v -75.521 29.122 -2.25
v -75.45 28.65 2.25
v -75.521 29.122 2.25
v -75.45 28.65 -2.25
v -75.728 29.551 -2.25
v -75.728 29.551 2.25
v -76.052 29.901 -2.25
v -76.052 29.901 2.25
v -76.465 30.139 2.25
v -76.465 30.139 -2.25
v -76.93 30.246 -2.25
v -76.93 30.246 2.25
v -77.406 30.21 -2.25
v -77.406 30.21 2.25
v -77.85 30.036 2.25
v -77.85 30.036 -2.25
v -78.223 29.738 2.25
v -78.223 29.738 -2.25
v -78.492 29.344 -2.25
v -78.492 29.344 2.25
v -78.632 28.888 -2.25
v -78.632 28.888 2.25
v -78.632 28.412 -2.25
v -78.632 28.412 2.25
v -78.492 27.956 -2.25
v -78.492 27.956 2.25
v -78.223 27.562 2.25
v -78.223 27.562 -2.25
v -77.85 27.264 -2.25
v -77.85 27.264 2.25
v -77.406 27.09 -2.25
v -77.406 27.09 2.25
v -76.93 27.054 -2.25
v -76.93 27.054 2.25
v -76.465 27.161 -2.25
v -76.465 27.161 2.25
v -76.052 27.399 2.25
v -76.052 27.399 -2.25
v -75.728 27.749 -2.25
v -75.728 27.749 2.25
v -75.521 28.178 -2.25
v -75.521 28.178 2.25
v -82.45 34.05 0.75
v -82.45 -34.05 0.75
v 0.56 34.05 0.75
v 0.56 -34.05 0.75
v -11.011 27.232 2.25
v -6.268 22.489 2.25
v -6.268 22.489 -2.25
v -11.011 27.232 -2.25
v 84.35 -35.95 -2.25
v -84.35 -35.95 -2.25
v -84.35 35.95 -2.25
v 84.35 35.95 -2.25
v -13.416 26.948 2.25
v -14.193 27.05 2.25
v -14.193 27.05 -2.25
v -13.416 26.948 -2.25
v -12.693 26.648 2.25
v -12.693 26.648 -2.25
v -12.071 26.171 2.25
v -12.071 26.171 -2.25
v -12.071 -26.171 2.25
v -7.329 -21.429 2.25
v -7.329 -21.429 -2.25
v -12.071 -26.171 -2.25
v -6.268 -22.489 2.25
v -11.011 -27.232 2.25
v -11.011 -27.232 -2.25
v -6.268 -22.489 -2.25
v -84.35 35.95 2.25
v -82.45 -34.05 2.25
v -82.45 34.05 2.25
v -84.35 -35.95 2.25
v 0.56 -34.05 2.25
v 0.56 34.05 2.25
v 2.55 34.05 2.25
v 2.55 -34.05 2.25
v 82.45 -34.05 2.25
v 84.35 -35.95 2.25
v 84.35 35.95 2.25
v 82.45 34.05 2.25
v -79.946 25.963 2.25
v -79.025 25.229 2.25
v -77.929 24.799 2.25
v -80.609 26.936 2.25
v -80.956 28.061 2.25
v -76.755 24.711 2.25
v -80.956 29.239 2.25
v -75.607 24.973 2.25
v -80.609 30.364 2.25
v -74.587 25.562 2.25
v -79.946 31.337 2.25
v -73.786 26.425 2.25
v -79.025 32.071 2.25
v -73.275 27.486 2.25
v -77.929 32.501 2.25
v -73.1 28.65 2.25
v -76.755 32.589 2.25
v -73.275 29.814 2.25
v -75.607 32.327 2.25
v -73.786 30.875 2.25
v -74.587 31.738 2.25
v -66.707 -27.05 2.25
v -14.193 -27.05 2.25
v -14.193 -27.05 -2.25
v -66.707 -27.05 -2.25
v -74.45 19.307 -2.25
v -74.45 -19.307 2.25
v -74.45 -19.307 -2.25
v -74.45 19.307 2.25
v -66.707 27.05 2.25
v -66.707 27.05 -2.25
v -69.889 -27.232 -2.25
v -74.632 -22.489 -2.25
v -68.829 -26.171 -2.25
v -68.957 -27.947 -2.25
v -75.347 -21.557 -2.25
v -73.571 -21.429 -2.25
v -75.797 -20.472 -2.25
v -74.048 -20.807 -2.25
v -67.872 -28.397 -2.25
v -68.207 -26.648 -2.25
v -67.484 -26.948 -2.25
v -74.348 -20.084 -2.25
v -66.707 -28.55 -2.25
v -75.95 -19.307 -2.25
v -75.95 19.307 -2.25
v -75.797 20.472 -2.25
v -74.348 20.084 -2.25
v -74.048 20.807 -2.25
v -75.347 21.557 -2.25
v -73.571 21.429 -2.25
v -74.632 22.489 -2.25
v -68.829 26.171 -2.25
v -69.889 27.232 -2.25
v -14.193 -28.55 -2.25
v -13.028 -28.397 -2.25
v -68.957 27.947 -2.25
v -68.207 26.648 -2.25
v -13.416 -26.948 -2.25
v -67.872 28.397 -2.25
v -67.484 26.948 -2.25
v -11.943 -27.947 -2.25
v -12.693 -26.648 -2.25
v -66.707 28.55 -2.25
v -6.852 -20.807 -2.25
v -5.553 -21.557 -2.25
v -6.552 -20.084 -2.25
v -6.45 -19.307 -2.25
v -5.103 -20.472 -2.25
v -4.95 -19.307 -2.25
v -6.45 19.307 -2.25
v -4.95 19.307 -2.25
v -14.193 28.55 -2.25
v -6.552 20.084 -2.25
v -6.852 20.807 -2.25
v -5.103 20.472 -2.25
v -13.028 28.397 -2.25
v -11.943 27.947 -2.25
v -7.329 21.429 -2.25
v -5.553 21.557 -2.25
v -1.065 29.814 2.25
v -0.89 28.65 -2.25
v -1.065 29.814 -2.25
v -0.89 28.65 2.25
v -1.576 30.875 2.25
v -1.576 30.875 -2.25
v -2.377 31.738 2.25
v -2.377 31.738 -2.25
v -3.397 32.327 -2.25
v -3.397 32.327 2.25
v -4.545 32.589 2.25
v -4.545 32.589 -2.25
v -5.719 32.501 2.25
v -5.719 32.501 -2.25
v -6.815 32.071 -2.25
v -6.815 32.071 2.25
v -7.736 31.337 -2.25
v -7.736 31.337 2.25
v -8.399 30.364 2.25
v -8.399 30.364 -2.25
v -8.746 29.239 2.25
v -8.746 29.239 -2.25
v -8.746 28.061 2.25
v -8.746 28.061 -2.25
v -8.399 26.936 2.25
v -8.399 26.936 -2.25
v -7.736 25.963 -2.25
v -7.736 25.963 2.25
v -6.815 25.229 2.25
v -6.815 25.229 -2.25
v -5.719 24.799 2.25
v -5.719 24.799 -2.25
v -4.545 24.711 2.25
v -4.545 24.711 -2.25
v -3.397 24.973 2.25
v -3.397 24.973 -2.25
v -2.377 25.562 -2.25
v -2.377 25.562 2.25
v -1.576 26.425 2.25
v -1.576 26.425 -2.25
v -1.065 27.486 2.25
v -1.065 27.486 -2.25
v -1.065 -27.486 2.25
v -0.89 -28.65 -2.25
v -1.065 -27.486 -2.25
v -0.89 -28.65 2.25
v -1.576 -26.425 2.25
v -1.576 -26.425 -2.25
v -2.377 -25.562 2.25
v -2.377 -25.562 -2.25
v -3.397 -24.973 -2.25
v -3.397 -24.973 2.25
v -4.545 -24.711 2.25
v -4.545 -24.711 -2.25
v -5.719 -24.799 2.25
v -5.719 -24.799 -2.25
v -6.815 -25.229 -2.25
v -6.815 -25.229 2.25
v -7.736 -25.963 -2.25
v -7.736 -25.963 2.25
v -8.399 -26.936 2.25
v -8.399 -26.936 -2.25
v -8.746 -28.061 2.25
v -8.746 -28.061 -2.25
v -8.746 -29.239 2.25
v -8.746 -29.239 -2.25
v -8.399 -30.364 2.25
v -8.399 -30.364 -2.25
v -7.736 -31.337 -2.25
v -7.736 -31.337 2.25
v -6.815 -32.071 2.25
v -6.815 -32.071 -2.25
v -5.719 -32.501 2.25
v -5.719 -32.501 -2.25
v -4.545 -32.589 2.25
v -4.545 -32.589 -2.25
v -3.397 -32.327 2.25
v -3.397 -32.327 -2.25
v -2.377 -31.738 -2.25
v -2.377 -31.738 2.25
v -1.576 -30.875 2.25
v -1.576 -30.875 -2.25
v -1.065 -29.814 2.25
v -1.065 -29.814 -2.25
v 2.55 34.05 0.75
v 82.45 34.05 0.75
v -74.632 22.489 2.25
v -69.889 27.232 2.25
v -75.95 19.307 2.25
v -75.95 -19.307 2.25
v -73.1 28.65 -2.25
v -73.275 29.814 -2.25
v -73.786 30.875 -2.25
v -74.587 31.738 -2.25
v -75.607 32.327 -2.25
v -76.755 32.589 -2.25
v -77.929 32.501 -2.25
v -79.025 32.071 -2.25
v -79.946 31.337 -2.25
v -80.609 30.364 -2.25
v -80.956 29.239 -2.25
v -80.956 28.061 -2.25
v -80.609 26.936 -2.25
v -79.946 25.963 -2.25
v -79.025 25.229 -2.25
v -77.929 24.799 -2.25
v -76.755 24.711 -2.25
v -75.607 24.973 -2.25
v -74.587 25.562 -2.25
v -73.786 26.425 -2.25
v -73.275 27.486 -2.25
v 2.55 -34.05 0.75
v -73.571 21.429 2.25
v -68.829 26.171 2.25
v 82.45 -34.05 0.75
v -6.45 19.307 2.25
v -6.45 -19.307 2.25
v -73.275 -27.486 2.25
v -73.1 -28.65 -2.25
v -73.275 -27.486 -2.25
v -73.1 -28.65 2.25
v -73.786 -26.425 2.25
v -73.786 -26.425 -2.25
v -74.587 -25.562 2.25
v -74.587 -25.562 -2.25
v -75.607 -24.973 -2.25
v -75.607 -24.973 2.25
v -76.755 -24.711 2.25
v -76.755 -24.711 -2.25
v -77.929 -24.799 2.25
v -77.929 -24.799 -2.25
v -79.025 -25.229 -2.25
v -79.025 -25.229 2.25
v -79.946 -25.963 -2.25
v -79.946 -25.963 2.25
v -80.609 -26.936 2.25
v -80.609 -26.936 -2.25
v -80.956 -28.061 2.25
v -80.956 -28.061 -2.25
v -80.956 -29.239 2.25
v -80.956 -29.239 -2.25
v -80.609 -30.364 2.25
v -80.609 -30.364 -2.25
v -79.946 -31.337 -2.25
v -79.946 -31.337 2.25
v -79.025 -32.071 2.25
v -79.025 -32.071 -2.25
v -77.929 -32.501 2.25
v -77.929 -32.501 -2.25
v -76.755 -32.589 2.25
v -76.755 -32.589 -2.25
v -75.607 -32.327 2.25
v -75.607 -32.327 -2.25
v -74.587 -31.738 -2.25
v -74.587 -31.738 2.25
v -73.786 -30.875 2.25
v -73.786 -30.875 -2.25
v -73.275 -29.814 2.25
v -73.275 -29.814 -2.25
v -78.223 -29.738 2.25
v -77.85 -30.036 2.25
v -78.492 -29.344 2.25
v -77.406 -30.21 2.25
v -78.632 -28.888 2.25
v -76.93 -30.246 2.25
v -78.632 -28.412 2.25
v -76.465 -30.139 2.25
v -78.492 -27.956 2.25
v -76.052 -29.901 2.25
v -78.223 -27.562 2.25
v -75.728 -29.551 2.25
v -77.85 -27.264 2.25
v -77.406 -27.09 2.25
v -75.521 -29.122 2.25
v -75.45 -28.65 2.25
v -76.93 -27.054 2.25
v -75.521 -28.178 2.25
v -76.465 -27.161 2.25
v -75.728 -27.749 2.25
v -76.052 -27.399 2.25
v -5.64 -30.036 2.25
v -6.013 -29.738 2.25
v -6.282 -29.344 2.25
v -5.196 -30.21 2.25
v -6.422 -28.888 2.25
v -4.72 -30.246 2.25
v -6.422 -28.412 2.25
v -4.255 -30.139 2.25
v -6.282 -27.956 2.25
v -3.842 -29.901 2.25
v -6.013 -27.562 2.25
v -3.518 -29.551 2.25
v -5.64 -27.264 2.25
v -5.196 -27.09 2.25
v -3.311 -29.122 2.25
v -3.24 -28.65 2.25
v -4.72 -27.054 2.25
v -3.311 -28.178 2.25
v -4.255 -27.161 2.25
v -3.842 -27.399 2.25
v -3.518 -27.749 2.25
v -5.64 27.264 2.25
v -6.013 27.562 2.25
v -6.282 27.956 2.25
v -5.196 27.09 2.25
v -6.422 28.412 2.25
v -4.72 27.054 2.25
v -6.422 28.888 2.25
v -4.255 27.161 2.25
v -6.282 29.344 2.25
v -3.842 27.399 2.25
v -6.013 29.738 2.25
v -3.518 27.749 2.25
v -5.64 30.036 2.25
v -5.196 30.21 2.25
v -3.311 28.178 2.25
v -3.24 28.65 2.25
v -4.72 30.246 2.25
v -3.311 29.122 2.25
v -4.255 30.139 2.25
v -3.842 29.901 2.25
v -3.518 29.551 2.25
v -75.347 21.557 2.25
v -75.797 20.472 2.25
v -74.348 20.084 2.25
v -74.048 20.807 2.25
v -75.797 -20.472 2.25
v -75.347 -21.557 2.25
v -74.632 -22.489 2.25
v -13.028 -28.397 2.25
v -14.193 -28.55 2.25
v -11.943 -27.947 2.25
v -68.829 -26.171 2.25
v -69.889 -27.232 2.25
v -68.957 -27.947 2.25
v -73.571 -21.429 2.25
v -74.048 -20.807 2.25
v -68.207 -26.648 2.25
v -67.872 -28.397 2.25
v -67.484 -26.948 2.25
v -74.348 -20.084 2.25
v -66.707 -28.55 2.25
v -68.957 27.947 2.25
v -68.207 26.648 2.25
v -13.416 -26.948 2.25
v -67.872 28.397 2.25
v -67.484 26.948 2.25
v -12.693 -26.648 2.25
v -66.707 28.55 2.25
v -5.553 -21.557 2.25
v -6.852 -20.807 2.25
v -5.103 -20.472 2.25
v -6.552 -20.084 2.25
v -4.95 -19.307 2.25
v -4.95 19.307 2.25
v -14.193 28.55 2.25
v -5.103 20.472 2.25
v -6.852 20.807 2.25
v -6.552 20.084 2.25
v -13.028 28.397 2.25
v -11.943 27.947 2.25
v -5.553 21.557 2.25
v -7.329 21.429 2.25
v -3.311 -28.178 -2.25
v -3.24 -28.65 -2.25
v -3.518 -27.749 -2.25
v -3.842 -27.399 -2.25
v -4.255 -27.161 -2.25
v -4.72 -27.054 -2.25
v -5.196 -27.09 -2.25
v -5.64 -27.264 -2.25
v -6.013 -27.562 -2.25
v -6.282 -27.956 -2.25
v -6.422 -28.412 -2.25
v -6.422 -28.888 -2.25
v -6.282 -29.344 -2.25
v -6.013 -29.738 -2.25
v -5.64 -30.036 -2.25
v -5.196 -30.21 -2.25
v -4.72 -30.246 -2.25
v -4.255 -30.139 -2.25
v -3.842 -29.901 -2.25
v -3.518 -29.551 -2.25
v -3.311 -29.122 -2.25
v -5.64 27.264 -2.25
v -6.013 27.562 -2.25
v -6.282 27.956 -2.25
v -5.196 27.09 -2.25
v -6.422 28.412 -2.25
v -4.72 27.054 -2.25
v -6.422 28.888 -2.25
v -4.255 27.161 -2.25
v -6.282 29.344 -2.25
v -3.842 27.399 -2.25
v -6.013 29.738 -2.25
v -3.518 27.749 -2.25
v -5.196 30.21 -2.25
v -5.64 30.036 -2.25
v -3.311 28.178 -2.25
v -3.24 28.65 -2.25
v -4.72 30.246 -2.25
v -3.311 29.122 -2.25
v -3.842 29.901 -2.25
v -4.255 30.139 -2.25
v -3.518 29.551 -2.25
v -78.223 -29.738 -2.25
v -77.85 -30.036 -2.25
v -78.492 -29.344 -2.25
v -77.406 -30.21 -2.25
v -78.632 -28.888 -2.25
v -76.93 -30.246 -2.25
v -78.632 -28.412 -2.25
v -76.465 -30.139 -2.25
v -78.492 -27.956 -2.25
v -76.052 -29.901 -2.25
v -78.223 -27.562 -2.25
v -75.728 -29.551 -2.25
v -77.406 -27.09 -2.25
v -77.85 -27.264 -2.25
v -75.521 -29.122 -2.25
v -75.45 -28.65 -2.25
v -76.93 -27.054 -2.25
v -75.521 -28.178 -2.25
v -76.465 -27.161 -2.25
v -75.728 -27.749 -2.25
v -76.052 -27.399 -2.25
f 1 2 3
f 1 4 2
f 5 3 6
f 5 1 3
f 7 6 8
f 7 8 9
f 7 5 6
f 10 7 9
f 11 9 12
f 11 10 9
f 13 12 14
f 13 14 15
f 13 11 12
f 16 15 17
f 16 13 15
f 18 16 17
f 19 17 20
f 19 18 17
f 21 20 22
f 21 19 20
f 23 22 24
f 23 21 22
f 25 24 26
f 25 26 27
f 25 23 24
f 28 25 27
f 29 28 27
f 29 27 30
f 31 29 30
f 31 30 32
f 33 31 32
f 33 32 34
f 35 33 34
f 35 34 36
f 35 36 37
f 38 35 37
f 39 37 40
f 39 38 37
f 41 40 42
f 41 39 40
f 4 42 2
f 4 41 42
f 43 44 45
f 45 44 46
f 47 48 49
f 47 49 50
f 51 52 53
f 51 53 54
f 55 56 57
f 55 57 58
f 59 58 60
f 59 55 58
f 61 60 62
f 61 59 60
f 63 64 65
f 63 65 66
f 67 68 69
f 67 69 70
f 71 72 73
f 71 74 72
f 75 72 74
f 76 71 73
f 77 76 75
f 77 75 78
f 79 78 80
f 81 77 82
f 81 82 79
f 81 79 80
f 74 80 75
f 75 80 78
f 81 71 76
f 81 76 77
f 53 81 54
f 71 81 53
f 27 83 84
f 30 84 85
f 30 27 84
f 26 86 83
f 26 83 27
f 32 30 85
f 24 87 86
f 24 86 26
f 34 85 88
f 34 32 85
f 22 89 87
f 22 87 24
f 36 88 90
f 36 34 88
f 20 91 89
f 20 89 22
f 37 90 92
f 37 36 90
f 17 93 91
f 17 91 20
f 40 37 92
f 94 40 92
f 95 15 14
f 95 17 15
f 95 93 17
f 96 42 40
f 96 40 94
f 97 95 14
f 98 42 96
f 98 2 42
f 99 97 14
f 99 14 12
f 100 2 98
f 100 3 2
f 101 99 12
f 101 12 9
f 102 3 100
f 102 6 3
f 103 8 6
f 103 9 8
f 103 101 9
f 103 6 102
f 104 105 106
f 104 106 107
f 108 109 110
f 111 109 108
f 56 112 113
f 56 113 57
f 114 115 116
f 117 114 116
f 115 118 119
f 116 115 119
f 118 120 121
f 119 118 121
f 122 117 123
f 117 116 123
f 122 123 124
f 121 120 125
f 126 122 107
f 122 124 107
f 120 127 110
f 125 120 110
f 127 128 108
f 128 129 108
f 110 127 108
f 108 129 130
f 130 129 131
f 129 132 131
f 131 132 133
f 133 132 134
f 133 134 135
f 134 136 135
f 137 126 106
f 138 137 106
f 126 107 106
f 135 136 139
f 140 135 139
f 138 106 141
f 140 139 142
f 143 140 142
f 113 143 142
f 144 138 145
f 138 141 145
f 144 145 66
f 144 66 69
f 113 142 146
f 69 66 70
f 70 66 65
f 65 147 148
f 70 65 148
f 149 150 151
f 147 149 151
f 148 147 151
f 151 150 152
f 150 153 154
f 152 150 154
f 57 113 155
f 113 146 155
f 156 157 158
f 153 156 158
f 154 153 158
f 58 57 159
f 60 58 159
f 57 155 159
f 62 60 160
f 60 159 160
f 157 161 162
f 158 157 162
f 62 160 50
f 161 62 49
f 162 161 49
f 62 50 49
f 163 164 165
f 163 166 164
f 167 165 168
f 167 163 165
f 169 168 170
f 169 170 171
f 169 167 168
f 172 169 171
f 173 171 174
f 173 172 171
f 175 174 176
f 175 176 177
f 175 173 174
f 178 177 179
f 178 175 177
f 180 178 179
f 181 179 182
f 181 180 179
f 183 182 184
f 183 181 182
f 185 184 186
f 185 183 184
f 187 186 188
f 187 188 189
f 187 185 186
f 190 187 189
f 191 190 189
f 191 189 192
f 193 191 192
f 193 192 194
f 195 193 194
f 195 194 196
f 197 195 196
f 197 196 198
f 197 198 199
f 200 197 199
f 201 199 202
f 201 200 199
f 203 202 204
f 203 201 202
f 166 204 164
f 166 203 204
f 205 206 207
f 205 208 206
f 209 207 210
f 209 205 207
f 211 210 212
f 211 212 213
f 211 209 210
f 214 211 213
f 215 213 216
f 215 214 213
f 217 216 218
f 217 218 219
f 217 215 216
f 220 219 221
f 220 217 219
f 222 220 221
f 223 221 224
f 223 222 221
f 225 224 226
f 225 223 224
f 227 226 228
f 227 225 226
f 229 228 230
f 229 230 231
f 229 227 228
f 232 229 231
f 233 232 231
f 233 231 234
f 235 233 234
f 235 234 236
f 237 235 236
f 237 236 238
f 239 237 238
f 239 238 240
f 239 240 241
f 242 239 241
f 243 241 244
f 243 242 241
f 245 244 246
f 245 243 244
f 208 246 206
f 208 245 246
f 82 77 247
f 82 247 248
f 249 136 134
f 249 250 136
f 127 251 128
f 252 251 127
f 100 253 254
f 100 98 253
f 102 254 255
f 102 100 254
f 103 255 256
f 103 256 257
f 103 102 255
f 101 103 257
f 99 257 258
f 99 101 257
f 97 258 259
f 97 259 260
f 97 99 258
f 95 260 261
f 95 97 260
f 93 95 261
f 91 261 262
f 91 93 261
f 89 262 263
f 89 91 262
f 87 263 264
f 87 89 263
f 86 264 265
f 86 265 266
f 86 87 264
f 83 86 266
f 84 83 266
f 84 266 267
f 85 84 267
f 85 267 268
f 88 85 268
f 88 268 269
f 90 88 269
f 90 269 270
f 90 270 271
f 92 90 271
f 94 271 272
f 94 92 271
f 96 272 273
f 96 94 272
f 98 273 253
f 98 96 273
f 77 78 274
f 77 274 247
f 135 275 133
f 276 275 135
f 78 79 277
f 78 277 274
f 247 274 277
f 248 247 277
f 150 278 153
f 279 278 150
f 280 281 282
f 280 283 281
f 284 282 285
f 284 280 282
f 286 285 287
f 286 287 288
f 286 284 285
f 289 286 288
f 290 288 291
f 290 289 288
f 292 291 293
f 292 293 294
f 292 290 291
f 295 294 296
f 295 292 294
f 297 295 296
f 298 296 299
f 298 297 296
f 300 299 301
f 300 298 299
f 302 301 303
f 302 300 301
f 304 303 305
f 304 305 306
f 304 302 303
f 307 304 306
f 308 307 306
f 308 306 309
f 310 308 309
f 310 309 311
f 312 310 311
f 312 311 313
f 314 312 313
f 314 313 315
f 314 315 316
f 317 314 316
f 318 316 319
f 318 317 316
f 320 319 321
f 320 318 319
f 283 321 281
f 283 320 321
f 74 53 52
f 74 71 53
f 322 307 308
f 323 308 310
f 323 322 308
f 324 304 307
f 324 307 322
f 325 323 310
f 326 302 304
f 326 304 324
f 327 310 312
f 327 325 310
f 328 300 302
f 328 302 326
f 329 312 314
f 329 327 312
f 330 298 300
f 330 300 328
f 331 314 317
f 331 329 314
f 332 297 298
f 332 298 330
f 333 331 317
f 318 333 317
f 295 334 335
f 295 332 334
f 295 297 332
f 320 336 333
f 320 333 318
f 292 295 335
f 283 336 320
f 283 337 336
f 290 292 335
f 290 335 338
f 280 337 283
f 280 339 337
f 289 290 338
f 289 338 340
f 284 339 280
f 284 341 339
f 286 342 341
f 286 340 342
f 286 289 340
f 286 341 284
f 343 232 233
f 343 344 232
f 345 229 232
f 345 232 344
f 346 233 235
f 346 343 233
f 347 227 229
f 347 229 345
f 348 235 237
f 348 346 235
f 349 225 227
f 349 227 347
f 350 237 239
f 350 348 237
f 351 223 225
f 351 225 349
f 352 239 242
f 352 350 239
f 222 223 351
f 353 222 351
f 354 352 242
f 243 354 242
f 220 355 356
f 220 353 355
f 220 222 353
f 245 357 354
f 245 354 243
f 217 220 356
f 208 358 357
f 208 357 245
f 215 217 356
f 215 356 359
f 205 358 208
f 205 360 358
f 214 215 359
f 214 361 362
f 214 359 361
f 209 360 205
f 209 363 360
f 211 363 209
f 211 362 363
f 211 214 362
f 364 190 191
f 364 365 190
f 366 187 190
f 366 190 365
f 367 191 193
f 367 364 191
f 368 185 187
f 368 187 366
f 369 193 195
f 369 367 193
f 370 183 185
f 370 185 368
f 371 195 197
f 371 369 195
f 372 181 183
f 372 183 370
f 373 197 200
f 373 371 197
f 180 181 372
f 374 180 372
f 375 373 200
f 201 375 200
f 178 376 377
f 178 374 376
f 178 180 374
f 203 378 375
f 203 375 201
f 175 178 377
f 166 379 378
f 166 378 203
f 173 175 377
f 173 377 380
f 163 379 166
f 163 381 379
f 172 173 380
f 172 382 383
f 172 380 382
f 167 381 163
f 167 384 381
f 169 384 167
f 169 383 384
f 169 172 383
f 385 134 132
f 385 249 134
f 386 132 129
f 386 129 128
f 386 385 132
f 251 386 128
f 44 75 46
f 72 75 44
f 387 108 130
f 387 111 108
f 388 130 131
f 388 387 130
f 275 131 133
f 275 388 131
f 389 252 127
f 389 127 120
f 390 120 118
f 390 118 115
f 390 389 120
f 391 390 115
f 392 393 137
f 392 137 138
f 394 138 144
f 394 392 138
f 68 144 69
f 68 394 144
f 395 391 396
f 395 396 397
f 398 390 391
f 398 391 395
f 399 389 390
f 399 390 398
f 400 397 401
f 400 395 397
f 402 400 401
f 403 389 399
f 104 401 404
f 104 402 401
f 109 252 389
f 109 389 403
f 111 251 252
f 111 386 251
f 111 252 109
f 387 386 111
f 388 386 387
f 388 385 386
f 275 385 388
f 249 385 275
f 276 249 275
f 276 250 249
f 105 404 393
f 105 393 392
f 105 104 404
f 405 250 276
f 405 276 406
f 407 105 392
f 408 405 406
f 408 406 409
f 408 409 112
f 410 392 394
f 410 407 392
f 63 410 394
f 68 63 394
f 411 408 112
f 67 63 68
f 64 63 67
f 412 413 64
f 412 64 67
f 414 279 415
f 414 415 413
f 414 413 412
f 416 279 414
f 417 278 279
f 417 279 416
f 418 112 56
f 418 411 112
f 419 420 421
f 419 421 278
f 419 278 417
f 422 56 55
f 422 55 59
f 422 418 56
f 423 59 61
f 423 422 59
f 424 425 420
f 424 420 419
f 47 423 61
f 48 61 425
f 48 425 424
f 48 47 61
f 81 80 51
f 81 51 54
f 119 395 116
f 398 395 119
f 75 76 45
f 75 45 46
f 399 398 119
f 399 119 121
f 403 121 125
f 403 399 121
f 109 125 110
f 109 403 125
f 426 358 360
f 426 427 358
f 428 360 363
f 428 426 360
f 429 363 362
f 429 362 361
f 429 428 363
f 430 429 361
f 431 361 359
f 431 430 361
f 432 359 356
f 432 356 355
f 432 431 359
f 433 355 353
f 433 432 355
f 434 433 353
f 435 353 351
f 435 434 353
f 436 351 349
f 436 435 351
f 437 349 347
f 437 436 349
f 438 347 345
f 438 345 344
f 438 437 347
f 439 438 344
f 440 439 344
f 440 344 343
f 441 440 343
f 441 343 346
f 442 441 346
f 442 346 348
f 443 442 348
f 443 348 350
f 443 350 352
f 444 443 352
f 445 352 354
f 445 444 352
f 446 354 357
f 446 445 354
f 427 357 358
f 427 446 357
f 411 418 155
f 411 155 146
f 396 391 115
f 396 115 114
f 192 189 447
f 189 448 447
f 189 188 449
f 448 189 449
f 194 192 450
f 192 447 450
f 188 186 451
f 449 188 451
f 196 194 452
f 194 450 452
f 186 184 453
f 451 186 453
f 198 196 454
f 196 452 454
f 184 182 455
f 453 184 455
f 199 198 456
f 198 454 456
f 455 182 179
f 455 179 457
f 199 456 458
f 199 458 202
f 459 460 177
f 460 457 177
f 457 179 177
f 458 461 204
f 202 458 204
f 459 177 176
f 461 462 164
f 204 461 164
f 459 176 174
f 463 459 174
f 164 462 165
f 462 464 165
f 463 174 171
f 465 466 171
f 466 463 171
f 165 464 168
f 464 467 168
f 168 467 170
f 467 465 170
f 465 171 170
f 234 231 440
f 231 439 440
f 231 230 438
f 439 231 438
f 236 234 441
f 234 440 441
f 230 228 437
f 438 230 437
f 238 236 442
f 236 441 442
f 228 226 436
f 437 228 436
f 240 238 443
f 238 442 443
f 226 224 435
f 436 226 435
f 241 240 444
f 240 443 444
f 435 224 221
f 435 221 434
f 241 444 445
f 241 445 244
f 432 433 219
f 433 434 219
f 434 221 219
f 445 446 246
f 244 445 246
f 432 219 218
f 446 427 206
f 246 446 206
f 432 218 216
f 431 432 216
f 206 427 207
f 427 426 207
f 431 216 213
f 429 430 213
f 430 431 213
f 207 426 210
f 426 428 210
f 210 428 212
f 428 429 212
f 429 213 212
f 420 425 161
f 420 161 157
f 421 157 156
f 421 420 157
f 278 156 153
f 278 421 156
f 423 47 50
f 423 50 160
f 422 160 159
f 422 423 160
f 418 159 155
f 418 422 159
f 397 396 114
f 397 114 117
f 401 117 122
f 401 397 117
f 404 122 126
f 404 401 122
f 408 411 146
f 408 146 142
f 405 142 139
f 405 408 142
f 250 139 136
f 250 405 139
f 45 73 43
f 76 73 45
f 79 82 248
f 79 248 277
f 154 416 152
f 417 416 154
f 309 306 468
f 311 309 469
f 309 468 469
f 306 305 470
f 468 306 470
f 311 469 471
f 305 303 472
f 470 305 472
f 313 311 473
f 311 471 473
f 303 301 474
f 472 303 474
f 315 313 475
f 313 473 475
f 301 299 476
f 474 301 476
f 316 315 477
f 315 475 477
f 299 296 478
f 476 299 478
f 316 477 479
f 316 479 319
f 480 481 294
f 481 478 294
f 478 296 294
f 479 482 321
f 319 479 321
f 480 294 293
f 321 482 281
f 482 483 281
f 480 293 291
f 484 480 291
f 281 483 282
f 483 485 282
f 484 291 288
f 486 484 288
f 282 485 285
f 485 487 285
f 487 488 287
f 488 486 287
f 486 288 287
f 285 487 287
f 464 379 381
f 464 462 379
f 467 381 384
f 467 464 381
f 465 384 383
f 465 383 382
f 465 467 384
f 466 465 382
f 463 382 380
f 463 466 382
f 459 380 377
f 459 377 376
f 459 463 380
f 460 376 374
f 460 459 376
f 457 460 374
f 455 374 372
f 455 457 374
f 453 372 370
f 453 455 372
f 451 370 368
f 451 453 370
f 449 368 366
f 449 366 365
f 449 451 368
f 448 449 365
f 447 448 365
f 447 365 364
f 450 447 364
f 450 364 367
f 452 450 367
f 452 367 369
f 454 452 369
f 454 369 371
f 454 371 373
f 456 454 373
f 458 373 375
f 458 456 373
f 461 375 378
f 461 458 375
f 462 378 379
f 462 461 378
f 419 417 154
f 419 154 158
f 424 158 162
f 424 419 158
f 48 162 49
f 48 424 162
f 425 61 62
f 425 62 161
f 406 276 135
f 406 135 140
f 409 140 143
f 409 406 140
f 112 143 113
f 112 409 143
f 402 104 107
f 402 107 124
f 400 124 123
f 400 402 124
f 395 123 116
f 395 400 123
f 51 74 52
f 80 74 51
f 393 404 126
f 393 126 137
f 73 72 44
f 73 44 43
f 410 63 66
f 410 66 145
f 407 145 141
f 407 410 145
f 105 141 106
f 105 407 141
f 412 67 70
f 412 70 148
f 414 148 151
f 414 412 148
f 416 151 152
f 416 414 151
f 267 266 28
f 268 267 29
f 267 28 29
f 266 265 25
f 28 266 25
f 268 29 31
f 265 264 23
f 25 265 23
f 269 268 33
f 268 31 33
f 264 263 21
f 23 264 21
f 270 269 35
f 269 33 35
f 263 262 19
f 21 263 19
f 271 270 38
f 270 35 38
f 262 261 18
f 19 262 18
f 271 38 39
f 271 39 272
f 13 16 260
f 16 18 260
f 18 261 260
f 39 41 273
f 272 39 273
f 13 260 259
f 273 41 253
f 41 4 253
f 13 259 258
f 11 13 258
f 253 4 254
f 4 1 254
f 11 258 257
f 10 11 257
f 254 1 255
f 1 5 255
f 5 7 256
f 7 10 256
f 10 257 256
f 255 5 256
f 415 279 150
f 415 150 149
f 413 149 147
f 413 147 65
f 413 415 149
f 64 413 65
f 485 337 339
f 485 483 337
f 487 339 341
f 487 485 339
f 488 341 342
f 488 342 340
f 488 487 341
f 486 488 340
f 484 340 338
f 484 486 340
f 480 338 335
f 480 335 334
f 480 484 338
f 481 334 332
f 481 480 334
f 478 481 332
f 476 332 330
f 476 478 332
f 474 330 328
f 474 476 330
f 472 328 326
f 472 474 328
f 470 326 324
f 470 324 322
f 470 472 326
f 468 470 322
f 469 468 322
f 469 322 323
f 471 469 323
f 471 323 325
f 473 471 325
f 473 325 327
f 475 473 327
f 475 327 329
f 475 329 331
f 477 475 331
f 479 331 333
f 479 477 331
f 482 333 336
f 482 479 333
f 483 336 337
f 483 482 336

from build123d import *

# Parameters (mm, degrees)
F1_DEPTH = 2.25
F0_R     = 3.95
F0_R_2   = 1.6
F2_W     = 83.01
F2_H     = 68.1
F2_W_2   = 79.9
F3_DEPTH = 3


# Not quite as in the source:
# - a feature of the source that left no trace in its solid (it failed there, or was rolled back) is left out


with BuildPart() as f1:
    # F0 (on Top) → F1 (new body, symmetric)
    with BuildSketch(Plane.XY):
        Polygon((-84.35, -35.95), (84.35, -35.95), (84.35, 0), (82.45, 0), (82.45, -34.05), (2.55, -34.05), (2.55, 0), (0.56, 0), (0.56, -34.05), (-82.45, -34.05), (-82.45, 0), (-84.35, 0), align=None)
        Polygon((82.45, 0), (84.35, 0), (84.35, 35.95), (-84.35, 35.95), (-84.35, 0), (-82.45, 0), (-82.45, 34.05), (0.56, 34.05), (0.56, 0), (2.55, 0), (2.55, 34.05), (82.45, 34.05), align=None)
    extrude(amount=F1_DEPTH, both=True)

    # F2 (on face) → F3 (join)
    with BuildSketch(Plane(origin=(0, 0, -2.25), x_dir=(1, 0, 0), z_dir=(0, 0, -1))):
        with Locations((-40.945, 0)):
            Rectangle(F2_W, F2_H)
        with Locations((42.5, 0)):
            Rectangle(F2_W_2, F2_H)
    extrude(amount=-F3_DEPTH)


with BuildPart() as f1b:
    # F0 (on Top) → F1, piece 2 (new body, symmetric)
    with BuildSketch(Plane.XY):
        with Locations((-77.05, 28.65)):
            Circle(F0_R)
        with Locations((-77.05, 28.65)):
            Circle(F0_R_2, mode=Mode.SUBTRACT)
    extrude(amount=F1_DEPTH, both=True)


with BuildPart() as f1c:
    # F0 (on Top) → F1, piece 3 (new body, symmetric)
    with BuildSketch(Plane.XY):
        with Locations((-77.05, -28.65)):
            Circle(F0_R)
        with Locations((-77.05, -28.65)):
            Circle(F0_R_2, mode=Mode.SUBTRACT)
    extrude(amount=F1_DEPTH, both=True)


with BuildPart() as f1d:
    # F0 (on Top) → F1, piece 4 (new body, symmetric)
    with BuildSketch(Plane.XY):
        with Locations((-4.84, 28.65)):
            Circle(F0_R)
        with Locations((-4.84, 28.65)):
            Circle(F0_R_2, mode=Mode.SUBTRACT)
    extrude(amount=F1_DEPTH, both=True)


with BuildPart() as f1e:
    # F0 (on Top) → F1, piece 5 (new body, symmetric)
    with BuildSketch(Plane.XY):
        with Locations((-4.84, -28.65)):
            Circle(F0_R)
        with Locations((-4.84, -28.65)):
            Circle(F0_R_2, mode=Mode.SUBTRACT)
    extrude(amount=F1_DEPTH, both=True)


with BuildPart() as f1f:
    # F0 (on Top) → F1, piece 6 (new body, symmetric)
    with BuildSketch(Plane.XY):
        with BuildLine():
            Line((-75.95, 19.3073593129), (-75.95, 0))
            Line((-75.95, 0), (-74.45, 0))
            Line((-74.45, 0), (-74.45, 19.3073593129))
            ThreePointArc((-74.45, 19.3073593129), (-74.2216385975, 20.45540961), (-73.5713203436, 21.4286796564))
            Line((-73.5713203436, 21.4286796564), (-68.8286796564, 26.1713203436))
            ThreePointArc((-68.8286796564, 26.1713203436), (-67.85540961, 26.8216385975), (-66.7073593129, 27.05))
            Line((-66.7073593129, 27.05), (-14.1926406871, 27.05))
            ThreePointArc((-14.1926406871, 27.05), (-13.04459039, 26.8216385975), (-12.0713203436, 26.1713203436))
            Line((-12.0713203436, 26.1713203436), (-7.3286796564, 21.4286796564))
            ThreePointArc((-7.3286796564, 21.4286796564), (-6.6783614025, 20.45540961), (-6.45, 19.3073593129))
            Line((-6.45, 19.3073593129), (-6.45, 0))
            Line((-6.45, 0), (-4.95, 0))
            Line((-4.95, 0), (-4.95, 19.3073593129))
            ThreePointArc((-4.95, 19.3073593129), (-5.2925421037, 21.0294347585), (-6.2680194847, 22.4893398282))
            Line((-6.2680194847, 22.4893398282), (-11.0106601718, 27.2319805153))
            ThreePointArc((-11.0106601718, 27.2319805153), (-12.4705652415, 28.2074578963), (-14.1926406871, 28.55))
            Line((-14.1926406871, 28.55), (-66.7073593129, 28.55))
            ThreePointArc((-66.7073593129, 28.55), (-68.4294347585, 28.2074578963), (-69.8893398282, 27.2319805153))
            Line((-69.8893398282, 27.2319805153), (-74.6319805153, 22.4893398282))
            ThreePointArc((-74.6319805153, 22.4893398282), (-75.6074578963, 21.0294347585), (-75.95, 19.3073593129))
        make_face()
        with BuildLine():
            Line((-74.45, 0), (-75.95, 0))
            Line((-75.95, 0), (-75.95, -19.3073593129))
            ThreePointArc((-75.95, -19.3073593129), (-75.6074578963, -21.0294347585), (-74.6319805153, -22.4893398282))
            Line((-74.6319805153, -22.4893398282), (-69.8893398282, -27.2319805153))
            ThreePointArc((-69.8893398282, -27.2319805153), (-68.4294347585, -28.2074578963), (-66.7073593129, -28.55))
            Line((-66.7073593129, -28.55), (-14.1926406871, -28.55))
            ThreePointArc((-14.1926406871, -28.55), (-12.4705652415, -28.2074578963), (-11.0106601718, -27.2319805153))
            Line((-11.0106601718, -27.2319805153), (-6.2680194847, -22.4893398282))
            ThreePointArc((-6.2680194847, -22.4893398282), (-5.2925421037, -21.0294347585), (-4.95, -19.3073593129))
            Line((-4.95, -19.3073593129), (-4.95, 0))
            Line((-4.95, 0), (-6.45, 0))
            Line((-6.45, 0), (-6.45, -19.3073593129))
            ThreePointArc((-6.45, -19.3073593129), (-6.6783614025, -20.45540961), (-7.3286796564, -21.4286796564))
            Line((-7.3286796564, -21.4286796564), (-12.0713203436, -26.1713203436))
            ThreePointArc((-12.0713203436, -26.1713203436), (-13.04459039, -26.8216385975), (-14.1926406871, -27.05))
            Line((-14.1926406871, -27.05), (-66.7073593129, -27.05))
            ThreePointArc((-66.7073593129, -27.05), (-67.85540961, -26.8216385975), (-68.8286796564, -26.1713203436))
            Line((-68.8286796564, -26.1713203436), (-73.5713203436, -21.4286796564))
            ThreePointArc((-73.5713203436, -21.4286796564), (-74.2216385975, -20.45540961), (-74.45, -19.3073593129))
            Line((-74.45, -19.3073593129), (-74.45, 0))
        make_face()
    extrude(amount=F1_DEPTH, both=True)


solid = Compound([f1.part, f1b.part, f1c.part, f1d.part, f1e.part, f1f.part])
